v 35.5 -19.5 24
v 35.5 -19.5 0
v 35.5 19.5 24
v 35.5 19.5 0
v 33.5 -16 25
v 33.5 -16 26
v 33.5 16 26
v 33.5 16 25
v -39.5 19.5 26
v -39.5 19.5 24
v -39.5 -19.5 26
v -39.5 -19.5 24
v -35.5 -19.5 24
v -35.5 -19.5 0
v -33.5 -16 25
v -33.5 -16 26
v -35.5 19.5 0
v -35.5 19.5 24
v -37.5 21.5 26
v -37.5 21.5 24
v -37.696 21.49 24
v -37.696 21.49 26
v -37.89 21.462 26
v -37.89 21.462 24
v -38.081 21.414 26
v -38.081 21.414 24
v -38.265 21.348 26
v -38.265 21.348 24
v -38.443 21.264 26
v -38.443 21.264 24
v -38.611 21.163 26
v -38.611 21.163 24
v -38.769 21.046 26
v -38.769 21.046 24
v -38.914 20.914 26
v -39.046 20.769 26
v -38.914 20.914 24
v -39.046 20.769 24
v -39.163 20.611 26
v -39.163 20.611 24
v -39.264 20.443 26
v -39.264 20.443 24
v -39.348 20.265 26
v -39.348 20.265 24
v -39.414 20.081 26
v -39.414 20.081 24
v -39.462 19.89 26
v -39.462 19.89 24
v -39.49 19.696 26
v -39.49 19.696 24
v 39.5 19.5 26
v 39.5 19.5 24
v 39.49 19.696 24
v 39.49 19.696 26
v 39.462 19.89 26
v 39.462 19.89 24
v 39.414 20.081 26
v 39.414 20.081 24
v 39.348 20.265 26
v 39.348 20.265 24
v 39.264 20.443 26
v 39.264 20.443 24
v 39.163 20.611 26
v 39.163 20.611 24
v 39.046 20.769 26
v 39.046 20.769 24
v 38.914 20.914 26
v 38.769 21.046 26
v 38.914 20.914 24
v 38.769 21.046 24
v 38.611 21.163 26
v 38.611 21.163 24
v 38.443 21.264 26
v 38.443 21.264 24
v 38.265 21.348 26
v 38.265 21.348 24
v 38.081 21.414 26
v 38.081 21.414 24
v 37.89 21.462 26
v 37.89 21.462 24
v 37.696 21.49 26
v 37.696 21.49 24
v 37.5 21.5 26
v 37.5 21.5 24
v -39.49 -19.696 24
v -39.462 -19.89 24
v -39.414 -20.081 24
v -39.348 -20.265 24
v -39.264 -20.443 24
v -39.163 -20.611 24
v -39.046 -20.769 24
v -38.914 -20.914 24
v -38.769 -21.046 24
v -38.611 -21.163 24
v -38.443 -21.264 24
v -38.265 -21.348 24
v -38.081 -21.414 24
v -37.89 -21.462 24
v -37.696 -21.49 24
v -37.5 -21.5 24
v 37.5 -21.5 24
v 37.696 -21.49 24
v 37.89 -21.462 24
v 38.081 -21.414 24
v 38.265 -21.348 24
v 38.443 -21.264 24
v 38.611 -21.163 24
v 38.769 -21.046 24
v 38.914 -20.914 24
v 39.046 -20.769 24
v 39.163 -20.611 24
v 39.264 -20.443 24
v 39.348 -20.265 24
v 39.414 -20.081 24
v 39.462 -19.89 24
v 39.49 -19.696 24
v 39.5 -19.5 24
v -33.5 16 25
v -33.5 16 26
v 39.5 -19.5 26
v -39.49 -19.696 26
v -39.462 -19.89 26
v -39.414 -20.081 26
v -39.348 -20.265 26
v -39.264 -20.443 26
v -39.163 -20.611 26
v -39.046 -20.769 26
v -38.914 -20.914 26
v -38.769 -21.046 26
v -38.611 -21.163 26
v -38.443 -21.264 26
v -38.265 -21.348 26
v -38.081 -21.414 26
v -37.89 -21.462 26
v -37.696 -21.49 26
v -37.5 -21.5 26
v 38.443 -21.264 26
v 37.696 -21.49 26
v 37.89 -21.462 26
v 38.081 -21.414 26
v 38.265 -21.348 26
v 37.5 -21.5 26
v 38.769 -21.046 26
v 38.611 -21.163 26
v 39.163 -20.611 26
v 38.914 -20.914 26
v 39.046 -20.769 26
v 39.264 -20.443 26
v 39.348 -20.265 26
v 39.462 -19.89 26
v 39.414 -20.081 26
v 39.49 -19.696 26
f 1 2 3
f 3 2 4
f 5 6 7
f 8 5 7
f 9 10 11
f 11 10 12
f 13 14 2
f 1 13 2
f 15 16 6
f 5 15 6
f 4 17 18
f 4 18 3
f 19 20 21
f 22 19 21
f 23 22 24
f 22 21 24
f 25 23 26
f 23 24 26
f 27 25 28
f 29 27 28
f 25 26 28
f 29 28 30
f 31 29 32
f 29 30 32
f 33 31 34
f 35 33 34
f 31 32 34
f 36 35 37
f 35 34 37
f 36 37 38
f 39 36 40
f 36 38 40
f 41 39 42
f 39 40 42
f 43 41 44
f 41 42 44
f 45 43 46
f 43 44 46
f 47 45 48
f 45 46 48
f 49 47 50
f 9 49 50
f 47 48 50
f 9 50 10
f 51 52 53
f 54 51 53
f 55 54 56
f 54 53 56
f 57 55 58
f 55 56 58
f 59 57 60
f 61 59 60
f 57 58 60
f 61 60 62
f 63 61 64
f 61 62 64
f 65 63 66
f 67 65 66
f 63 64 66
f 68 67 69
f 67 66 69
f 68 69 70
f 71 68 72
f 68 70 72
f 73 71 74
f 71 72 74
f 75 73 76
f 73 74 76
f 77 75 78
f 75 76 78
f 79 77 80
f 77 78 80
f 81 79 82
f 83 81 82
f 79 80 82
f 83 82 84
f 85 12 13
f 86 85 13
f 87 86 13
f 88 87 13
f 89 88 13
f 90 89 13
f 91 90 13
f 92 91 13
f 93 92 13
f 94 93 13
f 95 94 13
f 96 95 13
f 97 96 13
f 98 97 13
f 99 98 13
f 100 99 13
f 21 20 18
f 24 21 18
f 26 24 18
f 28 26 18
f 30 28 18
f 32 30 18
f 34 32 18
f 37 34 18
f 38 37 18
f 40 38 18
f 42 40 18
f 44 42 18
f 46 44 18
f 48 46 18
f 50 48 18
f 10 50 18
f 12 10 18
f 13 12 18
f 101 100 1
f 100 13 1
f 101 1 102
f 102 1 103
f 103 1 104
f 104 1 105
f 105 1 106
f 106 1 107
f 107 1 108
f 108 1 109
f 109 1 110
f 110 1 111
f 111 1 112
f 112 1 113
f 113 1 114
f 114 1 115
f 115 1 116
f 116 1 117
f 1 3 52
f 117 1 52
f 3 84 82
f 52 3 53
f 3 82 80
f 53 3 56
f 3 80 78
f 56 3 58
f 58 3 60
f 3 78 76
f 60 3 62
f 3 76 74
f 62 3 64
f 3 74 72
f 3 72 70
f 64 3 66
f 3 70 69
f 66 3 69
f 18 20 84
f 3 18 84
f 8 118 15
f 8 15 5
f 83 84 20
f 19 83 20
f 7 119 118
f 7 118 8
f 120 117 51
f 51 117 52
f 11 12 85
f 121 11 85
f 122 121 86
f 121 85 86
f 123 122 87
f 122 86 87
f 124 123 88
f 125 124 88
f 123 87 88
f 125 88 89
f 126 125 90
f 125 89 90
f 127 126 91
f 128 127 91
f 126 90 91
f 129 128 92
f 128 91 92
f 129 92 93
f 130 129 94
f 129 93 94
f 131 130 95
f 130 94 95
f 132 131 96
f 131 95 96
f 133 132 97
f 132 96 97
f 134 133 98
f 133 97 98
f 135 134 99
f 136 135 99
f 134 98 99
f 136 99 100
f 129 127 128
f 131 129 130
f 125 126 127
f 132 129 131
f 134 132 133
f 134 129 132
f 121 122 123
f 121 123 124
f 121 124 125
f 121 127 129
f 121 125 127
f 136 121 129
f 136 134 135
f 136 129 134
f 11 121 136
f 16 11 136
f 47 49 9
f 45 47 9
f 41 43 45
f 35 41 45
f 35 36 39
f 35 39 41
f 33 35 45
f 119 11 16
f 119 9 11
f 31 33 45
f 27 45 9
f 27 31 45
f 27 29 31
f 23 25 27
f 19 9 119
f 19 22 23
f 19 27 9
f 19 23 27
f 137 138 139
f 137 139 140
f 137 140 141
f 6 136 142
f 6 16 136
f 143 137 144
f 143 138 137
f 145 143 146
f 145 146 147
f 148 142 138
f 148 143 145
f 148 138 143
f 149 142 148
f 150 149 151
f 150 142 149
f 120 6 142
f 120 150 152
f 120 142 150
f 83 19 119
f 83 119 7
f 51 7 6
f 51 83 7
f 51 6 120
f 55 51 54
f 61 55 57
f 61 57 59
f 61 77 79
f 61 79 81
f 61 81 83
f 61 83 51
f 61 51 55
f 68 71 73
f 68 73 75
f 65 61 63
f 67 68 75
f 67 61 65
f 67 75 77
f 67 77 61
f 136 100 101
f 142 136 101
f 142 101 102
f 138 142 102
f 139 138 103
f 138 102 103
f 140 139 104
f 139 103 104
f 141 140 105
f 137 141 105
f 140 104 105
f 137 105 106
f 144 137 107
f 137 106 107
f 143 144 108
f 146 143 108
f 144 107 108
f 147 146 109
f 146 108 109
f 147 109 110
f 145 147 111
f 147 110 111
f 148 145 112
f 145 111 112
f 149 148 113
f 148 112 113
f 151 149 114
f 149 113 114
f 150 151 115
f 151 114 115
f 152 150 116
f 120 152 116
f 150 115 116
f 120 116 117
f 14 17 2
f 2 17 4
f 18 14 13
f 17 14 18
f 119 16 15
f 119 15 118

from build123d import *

# Parameters (mm, degrees)
SKETCH_1_W          = 71
SKETCH_1_H          = 39
EXTRUDE_1_DEPTH     = 24
EXTRUDE_2_DEPTH     = 2
SKETCH_3_W          = 67
SKETCH_3_H          = 32
CUT_EXTRUDE_1_DEPTH = 1


with BuildPart() as part:
    # 草图1 → 凸台-拉伸1 (new body)
    with BuildSketch(Plane.XY):
        Rectangle(SKETCH_1_W, SKETCH_1_H)
    extrude(amount=EXTRUDE_1_DEPTH)

    # 草图2 → 凸台-拉伸2 (add)
    with BuildSketch(Plane.XY.offset(24)):
        with BuildLine():
            Line((-37.5, -21.5), (37.5, -21.5))
            ThreePointArc((37.5, -21.5), (38.914213562, -20.914213562), (39.5, -19.5))
            Line((39.5, -19.5), (39.5, 19.5))
            ThreePointArc((39.5, 19.5), (38.914213562, 20.914213562), (37.5, 21.5))
            Line((37.5, 21.5), (-37.5, 21.5))
            ThreePointArc((-37.5, 21.5), (-38.914213562, 20.914213562), (-39.5, 19.5))
            Line((-39.5, 19.5), (-39.5, -19.5))
            ThreePointArc((-39.5, -19.5), (-38.914213562, -20.914213562), (-37.5, -21.5))
        make_face()
    extrude(amount=EXTRUDE_2_DEPTH)

    # 草图3 → 切除-拉伸1 (cut)
    with BuildSketch(Plane.XY.offset(26)):
        Rectangle(SKETCH_3_W, SKETCH_3_H)
    extrude(amount=-CUT_EXTRUDE_1_DEPTH, mode=Mode.SUBTRACT)


solid = part.part
